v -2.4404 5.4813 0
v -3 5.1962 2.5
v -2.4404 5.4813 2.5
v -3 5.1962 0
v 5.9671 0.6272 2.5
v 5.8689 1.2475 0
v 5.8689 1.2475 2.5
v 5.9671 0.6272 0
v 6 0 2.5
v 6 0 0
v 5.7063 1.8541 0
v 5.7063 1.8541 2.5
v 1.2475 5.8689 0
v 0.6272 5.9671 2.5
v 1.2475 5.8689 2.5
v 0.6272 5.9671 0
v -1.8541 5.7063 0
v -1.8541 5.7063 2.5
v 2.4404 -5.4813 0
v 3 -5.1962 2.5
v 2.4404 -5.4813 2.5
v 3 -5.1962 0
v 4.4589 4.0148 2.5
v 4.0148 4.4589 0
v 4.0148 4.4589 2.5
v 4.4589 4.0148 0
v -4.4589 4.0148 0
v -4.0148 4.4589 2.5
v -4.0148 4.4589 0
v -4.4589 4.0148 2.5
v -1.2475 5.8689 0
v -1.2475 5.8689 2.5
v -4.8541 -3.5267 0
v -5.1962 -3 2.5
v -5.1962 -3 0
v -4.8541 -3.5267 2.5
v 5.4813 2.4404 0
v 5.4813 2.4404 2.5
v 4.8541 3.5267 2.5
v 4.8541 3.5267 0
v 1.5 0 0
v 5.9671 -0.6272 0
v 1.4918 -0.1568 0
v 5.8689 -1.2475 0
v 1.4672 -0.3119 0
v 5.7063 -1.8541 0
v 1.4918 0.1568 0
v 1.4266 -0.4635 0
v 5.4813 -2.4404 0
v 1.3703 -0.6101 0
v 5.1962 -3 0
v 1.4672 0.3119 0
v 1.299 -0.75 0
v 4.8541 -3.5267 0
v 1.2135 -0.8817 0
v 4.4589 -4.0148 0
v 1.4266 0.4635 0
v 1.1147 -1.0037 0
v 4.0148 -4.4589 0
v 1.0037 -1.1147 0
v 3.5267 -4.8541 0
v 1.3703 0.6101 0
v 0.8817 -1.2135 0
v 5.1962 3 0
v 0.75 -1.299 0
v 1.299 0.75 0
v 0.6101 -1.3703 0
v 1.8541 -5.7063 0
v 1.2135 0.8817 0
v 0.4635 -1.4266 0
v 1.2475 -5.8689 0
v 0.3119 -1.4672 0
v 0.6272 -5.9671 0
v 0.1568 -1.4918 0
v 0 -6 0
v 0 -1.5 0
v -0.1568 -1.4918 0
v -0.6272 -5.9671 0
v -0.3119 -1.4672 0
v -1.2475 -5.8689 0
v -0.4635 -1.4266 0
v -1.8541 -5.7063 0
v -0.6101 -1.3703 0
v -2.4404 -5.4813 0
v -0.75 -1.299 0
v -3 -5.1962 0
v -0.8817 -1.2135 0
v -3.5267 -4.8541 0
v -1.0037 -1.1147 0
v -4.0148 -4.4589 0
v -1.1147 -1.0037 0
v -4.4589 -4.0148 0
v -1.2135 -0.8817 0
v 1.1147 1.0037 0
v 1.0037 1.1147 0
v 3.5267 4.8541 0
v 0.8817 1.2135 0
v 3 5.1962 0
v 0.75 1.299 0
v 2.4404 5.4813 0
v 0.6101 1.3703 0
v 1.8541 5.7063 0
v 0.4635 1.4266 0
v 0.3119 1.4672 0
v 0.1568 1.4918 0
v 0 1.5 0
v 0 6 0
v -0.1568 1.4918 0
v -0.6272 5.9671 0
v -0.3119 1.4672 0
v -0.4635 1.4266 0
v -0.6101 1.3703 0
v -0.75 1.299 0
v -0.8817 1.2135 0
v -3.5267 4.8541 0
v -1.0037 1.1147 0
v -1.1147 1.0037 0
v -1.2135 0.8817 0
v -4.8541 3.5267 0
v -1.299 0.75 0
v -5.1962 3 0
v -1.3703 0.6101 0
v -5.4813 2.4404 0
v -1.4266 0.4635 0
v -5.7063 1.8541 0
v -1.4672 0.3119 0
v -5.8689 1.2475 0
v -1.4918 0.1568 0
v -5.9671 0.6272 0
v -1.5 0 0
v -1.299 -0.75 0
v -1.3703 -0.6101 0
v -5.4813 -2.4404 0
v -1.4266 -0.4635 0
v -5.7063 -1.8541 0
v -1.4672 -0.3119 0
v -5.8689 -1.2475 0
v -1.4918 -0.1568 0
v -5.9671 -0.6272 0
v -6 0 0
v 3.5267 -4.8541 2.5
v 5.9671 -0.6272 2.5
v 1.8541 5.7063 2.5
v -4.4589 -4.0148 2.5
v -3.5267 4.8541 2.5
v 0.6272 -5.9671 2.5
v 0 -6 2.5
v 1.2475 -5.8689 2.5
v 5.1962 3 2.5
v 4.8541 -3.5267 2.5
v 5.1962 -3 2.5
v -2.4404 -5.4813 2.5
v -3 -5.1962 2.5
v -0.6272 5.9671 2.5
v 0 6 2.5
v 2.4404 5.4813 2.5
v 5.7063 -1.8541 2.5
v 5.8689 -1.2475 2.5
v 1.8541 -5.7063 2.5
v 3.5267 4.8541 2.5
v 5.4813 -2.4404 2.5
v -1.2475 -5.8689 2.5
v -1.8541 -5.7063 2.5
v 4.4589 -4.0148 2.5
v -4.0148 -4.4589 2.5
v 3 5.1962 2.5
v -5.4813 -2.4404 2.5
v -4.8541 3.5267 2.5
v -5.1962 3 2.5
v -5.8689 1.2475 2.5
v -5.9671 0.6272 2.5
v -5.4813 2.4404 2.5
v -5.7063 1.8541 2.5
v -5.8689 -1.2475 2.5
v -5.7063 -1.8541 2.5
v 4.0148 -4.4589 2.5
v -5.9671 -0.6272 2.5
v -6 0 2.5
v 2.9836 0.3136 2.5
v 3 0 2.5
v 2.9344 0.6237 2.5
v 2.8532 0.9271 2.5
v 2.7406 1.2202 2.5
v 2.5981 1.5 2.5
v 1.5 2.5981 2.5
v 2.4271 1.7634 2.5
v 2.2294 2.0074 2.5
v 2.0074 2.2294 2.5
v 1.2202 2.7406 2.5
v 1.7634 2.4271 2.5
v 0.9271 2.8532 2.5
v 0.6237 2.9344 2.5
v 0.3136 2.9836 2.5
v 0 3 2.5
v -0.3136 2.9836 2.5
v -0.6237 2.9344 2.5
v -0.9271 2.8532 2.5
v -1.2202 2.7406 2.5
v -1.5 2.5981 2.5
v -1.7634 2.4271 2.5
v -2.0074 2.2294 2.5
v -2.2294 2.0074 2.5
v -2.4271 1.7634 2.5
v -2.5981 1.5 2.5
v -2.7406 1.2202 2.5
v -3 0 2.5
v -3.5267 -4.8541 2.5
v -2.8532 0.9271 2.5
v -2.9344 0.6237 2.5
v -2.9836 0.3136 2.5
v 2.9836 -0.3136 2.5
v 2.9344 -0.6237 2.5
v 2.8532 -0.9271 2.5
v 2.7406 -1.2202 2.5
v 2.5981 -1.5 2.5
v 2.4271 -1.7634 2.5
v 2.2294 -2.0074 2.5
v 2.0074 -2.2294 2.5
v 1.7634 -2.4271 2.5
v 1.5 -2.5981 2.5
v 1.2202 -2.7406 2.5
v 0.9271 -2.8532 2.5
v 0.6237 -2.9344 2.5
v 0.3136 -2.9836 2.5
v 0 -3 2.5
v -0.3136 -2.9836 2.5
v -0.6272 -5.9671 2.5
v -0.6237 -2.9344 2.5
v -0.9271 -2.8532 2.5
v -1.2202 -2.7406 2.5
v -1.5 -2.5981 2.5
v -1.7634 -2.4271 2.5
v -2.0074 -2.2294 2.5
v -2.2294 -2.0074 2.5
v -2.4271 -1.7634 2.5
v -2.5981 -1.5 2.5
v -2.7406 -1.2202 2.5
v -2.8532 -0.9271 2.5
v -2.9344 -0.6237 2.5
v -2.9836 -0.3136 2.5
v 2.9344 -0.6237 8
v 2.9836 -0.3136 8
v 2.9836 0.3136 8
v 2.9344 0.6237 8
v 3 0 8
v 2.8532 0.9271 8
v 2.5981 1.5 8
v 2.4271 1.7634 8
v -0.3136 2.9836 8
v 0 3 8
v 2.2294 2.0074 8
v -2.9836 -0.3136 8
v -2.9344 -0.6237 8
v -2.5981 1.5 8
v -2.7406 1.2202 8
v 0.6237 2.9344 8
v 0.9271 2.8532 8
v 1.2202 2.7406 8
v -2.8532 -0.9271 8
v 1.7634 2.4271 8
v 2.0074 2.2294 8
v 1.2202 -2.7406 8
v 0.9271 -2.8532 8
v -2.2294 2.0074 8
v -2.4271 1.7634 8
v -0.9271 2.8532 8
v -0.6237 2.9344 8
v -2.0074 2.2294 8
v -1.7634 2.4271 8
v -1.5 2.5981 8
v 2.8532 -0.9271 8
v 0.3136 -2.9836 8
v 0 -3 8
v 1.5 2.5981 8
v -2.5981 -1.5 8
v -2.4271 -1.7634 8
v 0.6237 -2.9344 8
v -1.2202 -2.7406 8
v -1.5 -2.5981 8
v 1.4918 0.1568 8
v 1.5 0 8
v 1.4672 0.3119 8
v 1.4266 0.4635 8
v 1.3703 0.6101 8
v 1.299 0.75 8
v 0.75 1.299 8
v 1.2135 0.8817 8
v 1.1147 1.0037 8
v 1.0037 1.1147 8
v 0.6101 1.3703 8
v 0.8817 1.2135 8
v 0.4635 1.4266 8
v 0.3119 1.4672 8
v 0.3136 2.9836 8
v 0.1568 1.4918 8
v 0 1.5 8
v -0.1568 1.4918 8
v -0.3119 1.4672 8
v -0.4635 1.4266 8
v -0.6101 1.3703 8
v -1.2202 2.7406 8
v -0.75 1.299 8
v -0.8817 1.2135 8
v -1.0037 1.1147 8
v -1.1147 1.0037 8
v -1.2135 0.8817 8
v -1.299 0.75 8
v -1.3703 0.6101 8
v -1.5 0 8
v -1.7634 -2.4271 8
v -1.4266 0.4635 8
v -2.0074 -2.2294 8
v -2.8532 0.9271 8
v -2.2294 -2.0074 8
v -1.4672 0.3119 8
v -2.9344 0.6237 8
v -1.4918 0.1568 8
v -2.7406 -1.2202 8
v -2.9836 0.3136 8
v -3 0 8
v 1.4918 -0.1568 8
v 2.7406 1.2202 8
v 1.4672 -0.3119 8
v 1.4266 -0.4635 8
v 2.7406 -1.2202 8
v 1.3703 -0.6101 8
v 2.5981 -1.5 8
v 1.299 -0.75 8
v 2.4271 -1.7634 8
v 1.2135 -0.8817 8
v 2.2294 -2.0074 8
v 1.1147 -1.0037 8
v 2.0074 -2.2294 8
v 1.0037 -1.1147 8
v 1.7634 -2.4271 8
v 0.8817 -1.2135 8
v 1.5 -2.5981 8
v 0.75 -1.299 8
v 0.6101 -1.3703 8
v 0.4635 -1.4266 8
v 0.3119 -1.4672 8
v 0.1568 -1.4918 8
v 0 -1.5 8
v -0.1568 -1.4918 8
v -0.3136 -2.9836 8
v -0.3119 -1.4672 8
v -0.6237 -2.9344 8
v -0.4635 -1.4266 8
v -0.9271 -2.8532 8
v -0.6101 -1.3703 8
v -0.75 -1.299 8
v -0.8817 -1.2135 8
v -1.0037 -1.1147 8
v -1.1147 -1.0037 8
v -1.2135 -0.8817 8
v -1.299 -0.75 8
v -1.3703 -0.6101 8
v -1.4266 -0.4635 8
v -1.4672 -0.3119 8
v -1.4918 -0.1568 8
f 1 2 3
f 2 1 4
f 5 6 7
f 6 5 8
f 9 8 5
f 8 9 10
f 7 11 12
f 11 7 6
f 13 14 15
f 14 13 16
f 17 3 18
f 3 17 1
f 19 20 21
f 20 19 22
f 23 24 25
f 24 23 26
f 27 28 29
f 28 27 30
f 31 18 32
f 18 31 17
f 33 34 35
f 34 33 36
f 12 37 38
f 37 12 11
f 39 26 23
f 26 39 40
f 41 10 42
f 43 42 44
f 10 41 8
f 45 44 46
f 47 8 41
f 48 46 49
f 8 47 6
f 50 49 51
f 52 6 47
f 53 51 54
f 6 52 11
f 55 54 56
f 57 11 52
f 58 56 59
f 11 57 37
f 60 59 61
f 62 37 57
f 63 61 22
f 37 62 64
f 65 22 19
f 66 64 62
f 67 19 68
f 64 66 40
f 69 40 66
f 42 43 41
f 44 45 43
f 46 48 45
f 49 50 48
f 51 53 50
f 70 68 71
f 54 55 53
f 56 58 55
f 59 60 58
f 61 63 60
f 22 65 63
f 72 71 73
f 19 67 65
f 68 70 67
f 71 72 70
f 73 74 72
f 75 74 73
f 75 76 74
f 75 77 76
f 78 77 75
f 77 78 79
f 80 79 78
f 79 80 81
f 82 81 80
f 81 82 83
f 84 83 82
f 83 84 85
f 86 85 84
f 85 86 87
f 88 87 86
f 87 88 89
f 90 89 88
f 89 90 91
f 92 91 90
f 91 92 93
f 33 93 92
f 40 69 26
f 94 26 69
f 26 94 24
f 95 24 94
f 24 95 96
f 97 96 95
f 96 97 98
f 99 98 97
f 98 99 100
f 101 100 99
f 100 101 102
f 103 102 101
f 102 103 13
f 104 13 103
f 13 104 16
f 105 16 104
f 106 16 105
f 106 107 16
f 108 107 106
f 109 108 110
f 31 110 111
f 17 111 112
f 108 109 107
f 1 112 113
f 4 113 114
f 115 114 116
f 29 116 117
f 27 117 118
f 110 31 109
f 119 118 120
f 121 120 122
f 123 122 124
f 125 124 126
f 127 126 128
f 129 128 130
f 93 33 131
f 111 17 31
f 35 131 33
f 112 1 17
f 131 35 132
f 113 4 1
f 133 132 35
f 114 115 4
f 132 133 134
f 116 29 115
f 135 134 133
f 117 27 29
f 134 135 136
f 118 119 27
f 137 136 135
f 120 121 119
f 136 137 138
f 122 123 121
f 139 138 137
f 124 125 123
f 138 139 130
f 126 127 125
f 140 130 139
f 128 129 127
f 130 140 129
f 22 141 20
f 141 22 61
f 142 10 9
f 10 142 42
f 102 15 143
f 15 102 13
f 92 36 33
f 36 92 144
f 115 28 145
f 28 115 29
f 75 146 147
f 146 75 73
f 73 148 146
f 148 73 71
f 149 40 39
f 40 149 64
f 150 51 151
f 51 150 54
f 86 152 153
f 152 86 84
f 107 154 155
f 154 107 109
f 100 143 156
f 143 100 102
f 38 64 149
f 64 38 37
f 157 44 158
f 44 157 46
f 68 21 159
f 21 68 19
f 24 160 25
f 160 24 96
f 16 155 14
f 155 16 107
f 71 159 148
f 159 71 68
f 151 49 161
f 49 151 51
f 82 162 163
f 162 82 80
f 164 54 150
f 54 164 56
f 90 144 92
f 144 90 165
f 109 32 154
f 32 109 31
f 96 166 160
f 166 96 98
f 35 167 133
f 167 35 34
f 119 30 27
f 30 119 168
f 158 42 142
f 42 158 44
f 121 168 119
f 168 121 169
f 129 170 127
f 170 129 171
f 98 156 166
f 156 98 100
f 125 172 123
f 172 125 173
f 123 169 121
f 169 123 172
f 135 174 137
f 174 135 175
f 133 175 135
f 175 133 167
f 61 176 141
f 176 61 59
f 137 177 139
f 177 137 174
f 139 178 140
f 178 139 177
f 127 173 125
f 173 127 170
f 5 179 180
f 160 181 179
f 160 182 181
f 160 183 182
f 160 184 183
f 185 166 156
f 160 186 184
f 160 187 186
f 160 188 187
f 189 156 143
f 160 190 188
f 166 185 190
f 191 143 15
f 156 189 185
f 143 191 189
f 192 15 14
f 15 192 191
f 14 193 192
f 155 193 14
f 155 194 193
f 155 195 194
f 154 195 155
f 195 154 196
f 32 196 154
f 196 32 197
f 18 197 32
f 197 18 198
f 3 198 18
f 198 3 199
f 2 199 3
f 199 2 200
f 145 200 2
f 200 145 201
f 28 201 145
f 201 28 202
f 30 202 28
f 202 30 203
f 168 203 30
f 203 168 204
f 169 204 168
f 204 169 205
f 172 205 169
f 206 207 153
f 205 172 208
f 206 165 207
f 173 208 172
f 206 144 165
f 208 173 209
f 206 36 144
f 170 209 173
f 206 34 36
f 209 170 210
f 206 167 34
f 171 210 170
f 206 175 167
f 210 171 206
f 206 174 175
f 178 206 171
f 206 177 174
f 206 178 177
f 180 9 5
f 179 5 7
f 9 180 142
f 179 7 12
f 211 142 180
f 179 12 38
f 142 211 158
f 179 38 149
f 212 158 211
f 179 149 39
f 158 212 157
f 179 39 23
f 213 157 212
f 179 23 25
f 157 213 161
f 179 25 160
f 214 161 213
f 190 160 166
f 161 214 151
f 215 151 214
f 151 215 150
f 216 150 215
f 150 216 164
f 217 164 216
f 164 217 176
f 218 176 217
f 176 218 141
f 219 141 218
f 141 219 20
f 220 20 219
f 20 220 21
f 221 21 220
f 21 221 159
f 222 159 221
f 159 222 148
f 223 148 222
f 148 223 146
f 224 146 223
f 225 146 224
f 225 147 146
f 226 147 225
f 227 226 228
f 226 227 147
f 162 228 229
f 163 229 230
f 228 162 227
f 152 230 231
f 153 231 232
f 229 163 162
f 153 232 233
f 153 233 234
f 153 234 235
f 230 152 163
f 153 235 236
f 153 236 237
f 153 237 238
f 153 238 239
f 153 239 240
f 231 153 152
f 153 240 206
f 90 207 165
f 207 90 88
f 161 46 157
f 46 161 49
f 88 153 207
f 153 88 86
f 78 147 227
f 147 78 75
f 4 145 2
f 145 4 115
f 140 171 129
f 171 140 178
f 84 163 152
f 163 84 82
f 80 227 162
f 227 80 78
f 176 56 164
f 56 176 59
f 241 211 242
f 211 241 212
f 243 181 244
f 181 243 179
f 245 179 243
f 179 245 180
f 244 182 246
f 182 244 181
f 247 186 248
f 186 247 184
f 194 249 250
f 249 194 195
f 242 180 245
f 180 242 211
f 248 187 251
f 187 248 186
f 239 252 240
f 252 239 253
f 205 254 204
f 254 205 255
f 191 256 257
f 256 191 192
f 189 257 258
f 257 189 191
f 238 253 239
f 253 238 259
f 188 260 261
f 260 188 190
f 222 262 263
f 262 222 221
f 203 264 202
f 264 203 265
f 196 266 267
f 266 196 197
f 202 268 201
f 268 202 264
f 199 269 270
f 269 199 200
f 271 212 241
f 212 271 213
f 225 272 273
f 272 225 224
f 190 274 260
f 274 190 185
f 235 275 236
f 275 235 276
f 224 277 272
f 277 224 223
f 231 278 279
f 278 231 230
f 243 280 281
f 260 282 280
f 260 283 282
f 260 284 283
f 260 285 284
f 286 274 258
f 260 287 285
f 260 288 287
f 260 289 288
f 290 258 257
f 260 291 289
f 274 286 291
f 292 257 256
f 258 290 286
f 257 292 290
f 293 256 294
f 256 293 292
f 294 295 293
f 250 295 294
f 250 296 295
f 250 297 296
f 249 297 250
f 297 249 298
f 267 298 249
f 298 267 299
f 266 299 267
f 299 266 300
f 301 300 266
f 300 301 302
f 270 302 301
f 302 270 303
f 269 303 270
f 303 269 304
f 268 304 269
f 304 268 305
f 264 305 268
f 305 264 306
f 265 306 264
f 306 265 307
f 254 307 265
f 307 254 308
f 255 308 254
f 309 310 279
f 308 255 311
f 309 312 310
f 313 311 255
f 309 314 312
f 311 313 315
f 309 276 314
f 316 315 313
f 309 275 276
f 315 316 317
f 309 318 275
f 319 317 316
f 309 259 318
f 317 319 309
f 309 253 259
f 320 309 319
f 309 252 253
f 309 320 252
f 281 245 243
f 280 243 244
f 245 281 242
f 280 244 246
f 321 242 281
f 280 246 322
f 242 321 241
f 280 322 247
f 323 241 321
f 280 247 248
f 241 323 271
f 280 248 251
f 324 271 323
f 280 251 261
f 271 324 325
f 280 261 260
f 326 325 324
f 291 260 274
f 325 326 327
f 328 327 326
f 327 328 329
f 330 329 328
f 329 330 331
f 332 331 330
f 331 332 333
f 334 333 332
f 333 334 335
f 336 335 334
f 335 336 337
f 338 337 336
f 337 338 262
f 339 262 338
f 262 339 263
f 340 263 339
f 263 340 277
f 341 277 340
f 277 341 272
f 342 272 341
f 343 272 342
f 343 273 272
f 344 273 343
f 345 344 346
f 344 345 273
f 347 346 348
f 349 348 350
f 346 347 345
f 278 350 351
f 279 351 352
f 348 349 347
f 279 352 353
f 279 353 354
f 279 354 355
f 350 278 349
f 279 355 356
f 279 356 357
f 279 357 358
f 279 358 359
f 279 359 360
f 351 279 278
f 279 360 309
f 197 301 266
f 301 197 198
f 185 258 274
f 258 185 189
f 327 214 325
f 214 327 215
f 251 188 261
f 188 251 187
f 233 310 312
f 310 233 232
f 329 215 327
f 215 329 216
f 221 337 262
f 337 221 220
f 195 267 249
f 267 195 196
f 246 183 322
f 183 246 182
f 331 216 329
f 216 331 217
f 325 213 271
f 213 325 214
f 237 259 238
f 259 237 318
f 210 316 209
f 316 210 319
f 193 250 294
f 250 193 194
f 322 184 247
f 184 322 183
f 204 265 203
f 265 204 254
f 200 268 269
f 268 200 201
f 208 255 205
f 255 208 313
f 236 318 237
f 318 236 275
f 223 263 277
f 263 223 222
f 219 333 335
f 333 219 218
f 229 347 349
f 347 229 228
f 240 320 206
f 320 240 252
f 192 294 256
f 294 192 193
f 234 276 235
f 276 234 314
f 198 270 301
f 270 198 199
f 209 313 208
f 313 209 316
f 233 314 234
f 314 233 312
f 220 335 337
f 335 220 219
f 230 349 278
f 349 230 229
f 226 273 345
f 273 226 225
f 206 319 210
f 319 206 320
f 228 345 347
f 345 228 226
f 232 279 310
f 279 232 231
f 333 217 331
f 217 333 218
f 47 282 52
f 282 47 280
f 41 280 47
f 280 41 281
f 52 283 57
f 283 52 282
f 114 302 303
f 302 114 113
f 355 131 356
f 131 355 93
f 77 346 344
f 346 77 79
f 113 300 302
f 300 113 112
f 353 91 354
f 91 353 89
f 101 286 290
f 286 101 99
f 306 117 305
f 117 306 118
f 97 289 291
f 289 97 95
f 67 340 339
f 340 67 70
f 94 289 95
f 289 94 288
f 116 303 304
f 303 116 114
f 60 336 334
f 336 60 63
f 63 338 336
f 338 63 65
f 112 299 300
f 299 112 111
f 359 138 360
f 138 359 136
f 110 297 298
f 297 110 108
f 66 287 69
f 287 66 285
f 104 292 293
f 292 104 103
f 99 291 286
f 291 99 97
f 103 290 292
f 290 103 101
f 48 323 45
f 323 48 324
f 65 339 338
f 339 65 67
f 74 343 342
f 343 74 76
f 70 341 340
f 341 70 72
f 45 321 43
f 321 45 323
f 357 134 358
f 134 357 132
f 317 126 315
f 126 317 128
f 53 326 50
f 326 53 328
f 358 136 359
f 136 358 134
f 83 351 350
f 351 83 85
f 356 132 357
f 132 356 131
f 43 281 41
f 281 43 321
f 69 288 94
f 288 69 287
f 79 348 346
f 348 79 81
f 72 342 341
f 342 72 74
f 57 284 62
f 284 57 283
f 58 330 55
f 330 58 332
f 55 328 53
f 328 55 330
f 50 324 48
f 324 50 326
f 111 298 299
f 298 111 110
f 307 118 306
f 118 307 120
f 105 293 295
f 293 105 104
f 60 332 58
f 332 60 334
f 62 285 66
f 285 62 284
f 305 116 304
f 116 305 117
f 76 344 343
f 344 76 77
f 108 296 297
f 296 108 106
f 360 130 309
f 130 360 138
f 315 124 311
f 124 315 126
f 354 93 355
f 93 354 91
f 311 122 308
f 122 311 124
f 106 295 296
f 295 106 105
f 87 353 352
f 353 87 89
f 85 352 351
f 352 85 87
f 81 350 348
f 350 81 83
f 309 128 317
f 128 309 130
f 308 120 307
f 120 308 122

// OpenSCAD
// Flanged sleeve bushing.
$fn = 60;
eps = 0.02;
inner_d = 3;
outer_d = 6;
length = 8;
flange_d = 12;
flange_t = 2.5;
difference() {
    union() {
        cylinder(d = flange_d, h = flange_t);
        cylinder(d = outer_d, h = length);
    }
    translate([0, 0, -eps]) cylinder(d = inner_d, h = length + 2 * eps);
}
